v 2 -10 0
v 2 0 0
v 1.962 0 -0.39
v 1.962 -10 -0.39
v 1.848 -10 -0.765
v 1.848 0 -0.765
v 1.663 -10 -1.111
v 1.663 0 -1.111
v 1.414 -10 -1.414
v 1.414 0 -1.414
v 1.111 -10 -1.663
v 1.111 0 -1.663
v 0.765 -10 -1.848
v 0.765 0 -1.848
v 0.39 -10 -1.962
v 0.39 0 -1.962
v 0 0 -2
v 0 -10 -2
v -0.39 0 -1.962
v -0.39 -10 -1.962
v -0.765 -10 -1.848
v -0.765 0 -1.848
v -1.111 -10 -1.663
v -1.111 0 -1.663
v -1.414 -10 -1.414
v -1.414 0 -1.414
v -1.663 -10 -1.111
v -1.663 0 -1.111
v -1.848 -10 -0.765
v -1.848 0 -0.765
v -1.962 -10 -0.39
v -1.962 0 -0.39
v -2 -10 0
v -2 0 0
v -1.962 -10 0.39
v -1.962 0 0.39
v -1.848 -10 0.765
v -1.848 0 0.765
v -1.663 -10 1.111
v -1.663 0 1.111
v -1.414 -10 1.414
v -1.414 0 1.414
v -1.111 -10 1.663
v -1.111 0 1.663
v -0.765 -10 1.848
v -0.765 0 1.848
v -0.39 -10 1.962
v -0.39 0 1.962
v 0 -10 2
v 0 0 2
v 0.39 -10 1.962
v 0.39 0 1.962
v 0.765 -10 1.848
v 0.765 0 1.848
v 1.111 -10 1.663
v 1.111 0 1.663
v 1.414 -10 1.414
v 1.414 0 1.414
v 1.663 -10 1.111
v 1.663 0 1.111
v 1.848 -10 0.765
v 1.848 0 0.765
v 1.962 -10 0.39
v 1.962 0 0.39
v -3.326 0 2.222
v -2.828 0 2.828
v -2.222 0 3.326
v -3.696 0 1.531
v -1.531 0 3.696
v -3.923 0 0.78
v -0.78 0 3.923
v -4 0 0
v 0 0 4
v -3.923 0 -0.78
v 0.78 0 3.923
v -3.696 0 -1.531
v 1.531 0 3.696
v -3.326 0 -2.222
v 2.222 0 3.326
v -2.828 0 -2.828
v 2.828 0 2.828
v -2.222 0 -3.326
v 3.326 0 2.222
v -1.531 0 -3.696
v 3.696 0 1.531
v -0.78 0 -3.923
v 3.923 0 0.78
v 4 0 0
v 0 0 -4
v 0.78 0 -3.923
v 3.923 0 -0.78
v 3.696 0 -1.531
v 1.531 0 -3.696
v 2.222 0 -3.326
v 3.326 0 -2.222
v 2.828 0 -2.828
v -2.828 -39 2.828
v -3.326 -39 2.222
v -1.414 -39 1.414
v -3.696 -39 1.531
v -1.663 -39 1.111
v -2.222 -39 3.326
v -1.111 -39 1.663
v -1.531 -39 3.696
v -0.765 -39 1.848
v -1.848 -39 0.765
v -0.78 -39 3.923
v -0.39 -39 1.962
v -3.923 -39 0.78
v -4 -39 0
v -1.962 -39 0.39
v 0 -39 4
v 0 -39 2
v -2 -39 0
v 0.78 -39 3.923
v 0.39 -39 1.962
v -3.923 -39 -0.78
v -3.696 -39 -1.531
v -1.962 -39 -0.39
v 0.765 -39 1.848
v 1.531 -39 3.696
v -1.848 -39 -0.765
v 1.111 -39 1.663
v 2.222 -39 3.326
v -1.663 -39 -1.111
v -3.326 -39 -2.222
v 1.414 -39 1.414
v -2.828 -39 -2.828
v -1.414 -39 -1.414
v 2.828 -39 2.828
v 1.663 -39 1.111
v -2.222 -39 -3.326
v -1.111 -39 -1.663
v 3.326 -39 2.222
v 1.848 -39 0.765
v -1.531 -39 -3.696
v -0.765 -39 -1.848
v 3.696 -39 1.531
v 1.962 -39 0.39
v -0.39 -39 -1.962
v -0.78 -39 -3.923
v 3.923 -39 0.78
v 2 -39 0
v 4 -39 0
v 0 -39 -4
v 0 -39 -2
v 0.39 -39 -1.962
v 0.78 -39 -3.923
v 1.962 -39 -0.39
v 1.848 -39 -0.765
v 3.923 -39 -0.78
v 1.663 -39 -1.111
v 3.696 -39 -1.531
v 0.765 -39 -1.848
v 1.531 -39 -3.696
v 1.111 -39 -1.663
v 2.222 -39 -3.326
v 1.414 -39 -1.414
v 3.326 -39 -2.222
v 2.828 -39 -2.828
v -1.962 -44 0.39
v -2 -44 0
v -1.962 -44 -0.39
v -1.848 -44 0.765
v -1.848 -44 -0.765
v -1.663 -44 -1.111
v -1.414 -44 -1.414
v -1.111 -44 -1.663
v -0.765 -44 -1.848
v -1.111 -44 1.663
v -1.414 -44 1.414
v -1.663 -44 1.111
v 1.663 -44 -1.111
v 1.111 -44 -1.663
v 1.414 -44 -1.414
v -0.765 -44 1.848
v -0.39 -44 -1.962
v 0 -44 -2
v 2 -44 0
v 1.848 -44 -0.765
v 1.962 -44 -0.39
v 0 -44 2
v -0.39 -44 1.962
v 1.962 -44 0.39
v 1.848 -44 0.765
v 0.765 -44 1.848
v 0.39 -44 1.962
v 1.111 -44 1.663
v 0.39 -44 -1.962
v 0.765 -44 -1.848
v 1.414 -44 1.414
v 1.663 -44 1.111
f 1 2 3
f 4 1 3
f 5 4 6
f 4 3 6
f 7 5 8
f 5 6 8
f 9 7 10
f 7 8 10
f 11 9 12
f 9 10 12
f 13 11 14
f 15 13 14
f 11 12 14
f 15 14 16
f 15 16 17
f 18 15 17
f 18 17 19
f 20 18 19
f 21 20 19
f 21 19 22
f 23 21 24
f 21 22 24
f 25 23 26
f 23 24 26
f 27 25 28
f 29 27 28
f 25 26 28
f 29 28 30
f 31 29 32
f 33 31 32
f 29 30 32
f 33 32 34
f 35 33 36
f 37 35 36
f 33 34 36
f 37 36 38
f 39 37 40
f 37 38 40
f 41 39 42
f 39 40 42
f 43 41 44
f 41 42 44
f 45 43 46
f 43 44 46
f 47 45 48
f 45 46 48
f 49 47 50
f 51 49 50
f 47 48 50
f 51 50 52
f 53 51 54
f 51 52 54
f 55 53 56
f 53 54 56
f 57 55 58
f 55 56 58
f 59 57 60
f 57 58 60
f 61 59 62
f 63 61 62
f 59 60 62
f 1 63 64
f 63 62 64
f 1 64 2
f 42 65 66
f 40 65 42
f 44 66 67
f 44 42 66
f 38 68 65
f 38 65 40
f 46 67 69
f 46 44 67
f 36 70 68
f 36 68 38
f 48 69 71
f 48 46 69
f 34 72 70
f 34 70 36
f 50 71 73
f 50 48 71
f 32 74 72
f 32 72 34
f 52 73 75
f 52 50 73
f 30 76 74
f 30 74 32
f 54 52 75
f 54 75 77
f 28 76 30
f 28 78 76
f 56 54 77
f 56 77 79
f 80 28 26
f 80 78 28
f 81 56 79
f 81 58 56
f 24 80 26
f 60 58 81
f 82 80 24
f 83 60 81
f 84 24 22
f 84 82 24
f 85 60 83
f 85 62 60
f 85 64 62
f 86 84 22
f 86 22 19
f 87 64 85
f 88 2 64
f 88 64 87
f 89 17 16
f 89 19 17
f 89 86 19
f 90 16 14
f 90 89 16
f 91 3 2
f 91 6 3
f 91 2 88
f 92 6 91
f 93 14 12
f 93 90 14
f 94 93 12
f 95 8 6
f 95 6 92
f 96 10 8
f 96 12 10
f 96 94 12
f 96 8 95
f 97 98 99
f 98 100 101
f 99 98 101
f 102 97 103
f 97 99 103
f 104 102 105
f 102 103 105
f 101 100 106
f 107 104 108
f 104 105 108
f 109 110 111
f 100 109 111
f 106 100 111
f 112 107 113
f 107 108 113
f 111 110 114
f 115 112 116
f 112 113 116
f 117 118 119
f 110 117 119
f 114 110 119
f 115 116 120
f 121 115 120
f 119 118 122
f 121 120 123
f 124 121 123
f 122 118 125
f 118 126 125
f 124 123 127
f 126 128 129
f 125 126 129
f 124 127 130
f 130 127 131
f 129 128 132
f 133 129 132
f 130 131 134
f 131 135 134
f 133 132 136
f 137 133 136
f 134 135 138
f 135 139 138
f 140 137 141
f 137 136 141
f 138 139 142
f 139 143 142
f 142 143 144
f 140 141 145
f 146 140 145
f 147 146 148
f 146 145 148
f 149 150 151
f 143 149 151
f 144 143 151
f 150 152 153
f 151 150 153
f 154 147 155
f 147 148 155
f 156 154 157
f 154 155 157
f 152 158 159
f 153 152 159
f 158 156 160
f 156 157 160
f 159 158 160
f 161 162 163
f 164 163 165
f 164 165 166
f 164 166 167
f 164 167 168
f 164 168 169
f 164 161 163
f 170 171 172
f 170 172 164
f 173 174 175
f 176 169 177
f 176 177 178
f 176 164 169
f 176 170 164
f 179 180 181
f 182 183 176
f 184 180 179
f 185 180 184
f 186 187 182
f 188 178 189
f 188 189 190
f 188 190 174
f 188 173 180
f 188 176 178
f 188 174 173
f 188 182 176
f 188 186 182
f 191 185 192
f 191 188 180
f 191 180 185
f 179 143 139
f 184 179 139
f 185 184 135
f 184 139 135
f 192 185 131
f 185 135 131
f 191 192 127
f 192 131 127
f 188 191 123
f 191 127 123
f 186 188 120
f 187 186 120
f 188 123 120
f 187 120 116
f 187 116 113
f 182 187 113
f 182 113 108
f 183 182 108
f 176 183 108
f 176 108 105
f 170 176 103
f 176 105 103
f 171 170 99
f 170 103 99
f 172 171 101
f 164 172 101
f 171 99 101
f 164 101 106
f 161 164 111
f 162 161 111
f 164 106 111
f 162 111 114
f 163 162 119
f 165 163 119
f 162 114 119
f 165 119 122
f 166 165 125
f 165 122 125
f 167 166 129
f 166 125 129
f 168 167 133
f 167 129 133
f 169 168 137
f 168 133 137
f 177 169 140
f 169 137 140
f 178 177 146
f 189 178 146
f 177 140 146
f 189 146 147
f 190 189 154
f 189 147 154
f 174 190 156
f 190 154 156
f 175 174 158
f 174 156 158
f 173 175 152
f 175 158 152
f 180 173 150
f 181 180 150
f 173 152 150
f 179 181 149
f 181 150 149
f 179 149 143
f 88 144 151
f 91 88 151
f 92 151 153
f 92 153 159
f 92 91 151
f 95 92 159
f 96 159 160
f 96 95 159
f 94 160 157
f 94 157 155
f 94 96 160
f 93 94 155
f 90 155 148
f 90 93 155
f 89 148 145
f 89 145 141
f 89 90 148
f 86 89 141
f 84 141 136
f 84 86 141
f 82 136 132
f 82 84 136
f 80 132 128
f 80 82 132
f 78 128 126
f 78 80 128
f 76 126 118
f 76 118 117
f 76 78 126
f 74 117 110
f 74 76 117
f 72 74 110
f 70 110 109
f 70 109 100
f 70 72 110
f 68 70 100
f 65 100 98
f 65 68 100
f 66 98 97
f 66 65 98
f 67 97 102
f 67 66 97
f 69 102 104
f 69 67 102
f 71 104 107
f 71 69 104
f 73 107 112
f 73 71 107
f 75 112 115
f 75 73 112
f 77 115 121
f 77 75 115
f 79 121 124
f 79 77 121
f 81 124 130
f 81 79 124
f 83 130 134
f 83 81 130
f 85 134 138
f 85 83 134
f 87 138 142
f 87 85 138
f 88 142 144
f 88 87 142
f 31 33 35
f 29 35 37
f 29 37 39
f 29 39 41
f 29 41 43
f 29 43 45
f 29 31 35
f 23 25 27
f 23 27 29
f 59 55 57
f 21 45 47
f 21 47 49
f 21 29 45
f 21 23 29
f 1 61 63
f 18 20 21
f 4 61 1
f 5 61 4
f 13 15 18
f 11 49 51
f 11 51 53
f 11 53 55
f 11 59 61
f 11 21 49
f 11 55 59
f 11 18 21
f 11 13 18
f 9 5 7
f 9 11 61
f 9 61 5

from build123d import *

# Parameters (mm, degrees)
ESQUISSE1_R             = 4
BOSS_EXTRU_1_DEPTH      = 39
ESQUISSE3_R             = 2
ENL_V_MAT_EXTRU_1_DEPTH = 10
ESQUISSE4_R             = 2
BOSS_EXTRU_2_DEPTH      = 5


with BuildPart() as part:
    # Esquisse1 → Boss.-Extru.1 (new body)
    with BuildSketch(Plane(origin=(0, 0, 0), x_dir=(1, 0, 0), z_dir=(0, 1, 0))):
        Circle(ESQUISSE1_R)
    extrude(amount=-BOSS_EXTRU_1_DEPTH)

    # Esquisse3 → Enlèv. mat.-Extru.1 (cut)
    with BuildSketch(Plane(origin=(0, 0, 0), x_dir=(1, 0, 0), z_dir=(0, 1, 0))):
        Circle(ESQUISSE3_R)
    extrude(amount=-ENL_V_MAT_EXTRU_1_DEPTH, mode=Mode.SUBTRACT)

    # Esquisse4 → Boss.-Extru.2 (add)
    with BuildSketch(Plane.XZ.offset(39)):
        Circle(ESQUISSE4_R)
    extrude(amount=BOSS_EXTRU_2_DEPTH)


solid = part.part
